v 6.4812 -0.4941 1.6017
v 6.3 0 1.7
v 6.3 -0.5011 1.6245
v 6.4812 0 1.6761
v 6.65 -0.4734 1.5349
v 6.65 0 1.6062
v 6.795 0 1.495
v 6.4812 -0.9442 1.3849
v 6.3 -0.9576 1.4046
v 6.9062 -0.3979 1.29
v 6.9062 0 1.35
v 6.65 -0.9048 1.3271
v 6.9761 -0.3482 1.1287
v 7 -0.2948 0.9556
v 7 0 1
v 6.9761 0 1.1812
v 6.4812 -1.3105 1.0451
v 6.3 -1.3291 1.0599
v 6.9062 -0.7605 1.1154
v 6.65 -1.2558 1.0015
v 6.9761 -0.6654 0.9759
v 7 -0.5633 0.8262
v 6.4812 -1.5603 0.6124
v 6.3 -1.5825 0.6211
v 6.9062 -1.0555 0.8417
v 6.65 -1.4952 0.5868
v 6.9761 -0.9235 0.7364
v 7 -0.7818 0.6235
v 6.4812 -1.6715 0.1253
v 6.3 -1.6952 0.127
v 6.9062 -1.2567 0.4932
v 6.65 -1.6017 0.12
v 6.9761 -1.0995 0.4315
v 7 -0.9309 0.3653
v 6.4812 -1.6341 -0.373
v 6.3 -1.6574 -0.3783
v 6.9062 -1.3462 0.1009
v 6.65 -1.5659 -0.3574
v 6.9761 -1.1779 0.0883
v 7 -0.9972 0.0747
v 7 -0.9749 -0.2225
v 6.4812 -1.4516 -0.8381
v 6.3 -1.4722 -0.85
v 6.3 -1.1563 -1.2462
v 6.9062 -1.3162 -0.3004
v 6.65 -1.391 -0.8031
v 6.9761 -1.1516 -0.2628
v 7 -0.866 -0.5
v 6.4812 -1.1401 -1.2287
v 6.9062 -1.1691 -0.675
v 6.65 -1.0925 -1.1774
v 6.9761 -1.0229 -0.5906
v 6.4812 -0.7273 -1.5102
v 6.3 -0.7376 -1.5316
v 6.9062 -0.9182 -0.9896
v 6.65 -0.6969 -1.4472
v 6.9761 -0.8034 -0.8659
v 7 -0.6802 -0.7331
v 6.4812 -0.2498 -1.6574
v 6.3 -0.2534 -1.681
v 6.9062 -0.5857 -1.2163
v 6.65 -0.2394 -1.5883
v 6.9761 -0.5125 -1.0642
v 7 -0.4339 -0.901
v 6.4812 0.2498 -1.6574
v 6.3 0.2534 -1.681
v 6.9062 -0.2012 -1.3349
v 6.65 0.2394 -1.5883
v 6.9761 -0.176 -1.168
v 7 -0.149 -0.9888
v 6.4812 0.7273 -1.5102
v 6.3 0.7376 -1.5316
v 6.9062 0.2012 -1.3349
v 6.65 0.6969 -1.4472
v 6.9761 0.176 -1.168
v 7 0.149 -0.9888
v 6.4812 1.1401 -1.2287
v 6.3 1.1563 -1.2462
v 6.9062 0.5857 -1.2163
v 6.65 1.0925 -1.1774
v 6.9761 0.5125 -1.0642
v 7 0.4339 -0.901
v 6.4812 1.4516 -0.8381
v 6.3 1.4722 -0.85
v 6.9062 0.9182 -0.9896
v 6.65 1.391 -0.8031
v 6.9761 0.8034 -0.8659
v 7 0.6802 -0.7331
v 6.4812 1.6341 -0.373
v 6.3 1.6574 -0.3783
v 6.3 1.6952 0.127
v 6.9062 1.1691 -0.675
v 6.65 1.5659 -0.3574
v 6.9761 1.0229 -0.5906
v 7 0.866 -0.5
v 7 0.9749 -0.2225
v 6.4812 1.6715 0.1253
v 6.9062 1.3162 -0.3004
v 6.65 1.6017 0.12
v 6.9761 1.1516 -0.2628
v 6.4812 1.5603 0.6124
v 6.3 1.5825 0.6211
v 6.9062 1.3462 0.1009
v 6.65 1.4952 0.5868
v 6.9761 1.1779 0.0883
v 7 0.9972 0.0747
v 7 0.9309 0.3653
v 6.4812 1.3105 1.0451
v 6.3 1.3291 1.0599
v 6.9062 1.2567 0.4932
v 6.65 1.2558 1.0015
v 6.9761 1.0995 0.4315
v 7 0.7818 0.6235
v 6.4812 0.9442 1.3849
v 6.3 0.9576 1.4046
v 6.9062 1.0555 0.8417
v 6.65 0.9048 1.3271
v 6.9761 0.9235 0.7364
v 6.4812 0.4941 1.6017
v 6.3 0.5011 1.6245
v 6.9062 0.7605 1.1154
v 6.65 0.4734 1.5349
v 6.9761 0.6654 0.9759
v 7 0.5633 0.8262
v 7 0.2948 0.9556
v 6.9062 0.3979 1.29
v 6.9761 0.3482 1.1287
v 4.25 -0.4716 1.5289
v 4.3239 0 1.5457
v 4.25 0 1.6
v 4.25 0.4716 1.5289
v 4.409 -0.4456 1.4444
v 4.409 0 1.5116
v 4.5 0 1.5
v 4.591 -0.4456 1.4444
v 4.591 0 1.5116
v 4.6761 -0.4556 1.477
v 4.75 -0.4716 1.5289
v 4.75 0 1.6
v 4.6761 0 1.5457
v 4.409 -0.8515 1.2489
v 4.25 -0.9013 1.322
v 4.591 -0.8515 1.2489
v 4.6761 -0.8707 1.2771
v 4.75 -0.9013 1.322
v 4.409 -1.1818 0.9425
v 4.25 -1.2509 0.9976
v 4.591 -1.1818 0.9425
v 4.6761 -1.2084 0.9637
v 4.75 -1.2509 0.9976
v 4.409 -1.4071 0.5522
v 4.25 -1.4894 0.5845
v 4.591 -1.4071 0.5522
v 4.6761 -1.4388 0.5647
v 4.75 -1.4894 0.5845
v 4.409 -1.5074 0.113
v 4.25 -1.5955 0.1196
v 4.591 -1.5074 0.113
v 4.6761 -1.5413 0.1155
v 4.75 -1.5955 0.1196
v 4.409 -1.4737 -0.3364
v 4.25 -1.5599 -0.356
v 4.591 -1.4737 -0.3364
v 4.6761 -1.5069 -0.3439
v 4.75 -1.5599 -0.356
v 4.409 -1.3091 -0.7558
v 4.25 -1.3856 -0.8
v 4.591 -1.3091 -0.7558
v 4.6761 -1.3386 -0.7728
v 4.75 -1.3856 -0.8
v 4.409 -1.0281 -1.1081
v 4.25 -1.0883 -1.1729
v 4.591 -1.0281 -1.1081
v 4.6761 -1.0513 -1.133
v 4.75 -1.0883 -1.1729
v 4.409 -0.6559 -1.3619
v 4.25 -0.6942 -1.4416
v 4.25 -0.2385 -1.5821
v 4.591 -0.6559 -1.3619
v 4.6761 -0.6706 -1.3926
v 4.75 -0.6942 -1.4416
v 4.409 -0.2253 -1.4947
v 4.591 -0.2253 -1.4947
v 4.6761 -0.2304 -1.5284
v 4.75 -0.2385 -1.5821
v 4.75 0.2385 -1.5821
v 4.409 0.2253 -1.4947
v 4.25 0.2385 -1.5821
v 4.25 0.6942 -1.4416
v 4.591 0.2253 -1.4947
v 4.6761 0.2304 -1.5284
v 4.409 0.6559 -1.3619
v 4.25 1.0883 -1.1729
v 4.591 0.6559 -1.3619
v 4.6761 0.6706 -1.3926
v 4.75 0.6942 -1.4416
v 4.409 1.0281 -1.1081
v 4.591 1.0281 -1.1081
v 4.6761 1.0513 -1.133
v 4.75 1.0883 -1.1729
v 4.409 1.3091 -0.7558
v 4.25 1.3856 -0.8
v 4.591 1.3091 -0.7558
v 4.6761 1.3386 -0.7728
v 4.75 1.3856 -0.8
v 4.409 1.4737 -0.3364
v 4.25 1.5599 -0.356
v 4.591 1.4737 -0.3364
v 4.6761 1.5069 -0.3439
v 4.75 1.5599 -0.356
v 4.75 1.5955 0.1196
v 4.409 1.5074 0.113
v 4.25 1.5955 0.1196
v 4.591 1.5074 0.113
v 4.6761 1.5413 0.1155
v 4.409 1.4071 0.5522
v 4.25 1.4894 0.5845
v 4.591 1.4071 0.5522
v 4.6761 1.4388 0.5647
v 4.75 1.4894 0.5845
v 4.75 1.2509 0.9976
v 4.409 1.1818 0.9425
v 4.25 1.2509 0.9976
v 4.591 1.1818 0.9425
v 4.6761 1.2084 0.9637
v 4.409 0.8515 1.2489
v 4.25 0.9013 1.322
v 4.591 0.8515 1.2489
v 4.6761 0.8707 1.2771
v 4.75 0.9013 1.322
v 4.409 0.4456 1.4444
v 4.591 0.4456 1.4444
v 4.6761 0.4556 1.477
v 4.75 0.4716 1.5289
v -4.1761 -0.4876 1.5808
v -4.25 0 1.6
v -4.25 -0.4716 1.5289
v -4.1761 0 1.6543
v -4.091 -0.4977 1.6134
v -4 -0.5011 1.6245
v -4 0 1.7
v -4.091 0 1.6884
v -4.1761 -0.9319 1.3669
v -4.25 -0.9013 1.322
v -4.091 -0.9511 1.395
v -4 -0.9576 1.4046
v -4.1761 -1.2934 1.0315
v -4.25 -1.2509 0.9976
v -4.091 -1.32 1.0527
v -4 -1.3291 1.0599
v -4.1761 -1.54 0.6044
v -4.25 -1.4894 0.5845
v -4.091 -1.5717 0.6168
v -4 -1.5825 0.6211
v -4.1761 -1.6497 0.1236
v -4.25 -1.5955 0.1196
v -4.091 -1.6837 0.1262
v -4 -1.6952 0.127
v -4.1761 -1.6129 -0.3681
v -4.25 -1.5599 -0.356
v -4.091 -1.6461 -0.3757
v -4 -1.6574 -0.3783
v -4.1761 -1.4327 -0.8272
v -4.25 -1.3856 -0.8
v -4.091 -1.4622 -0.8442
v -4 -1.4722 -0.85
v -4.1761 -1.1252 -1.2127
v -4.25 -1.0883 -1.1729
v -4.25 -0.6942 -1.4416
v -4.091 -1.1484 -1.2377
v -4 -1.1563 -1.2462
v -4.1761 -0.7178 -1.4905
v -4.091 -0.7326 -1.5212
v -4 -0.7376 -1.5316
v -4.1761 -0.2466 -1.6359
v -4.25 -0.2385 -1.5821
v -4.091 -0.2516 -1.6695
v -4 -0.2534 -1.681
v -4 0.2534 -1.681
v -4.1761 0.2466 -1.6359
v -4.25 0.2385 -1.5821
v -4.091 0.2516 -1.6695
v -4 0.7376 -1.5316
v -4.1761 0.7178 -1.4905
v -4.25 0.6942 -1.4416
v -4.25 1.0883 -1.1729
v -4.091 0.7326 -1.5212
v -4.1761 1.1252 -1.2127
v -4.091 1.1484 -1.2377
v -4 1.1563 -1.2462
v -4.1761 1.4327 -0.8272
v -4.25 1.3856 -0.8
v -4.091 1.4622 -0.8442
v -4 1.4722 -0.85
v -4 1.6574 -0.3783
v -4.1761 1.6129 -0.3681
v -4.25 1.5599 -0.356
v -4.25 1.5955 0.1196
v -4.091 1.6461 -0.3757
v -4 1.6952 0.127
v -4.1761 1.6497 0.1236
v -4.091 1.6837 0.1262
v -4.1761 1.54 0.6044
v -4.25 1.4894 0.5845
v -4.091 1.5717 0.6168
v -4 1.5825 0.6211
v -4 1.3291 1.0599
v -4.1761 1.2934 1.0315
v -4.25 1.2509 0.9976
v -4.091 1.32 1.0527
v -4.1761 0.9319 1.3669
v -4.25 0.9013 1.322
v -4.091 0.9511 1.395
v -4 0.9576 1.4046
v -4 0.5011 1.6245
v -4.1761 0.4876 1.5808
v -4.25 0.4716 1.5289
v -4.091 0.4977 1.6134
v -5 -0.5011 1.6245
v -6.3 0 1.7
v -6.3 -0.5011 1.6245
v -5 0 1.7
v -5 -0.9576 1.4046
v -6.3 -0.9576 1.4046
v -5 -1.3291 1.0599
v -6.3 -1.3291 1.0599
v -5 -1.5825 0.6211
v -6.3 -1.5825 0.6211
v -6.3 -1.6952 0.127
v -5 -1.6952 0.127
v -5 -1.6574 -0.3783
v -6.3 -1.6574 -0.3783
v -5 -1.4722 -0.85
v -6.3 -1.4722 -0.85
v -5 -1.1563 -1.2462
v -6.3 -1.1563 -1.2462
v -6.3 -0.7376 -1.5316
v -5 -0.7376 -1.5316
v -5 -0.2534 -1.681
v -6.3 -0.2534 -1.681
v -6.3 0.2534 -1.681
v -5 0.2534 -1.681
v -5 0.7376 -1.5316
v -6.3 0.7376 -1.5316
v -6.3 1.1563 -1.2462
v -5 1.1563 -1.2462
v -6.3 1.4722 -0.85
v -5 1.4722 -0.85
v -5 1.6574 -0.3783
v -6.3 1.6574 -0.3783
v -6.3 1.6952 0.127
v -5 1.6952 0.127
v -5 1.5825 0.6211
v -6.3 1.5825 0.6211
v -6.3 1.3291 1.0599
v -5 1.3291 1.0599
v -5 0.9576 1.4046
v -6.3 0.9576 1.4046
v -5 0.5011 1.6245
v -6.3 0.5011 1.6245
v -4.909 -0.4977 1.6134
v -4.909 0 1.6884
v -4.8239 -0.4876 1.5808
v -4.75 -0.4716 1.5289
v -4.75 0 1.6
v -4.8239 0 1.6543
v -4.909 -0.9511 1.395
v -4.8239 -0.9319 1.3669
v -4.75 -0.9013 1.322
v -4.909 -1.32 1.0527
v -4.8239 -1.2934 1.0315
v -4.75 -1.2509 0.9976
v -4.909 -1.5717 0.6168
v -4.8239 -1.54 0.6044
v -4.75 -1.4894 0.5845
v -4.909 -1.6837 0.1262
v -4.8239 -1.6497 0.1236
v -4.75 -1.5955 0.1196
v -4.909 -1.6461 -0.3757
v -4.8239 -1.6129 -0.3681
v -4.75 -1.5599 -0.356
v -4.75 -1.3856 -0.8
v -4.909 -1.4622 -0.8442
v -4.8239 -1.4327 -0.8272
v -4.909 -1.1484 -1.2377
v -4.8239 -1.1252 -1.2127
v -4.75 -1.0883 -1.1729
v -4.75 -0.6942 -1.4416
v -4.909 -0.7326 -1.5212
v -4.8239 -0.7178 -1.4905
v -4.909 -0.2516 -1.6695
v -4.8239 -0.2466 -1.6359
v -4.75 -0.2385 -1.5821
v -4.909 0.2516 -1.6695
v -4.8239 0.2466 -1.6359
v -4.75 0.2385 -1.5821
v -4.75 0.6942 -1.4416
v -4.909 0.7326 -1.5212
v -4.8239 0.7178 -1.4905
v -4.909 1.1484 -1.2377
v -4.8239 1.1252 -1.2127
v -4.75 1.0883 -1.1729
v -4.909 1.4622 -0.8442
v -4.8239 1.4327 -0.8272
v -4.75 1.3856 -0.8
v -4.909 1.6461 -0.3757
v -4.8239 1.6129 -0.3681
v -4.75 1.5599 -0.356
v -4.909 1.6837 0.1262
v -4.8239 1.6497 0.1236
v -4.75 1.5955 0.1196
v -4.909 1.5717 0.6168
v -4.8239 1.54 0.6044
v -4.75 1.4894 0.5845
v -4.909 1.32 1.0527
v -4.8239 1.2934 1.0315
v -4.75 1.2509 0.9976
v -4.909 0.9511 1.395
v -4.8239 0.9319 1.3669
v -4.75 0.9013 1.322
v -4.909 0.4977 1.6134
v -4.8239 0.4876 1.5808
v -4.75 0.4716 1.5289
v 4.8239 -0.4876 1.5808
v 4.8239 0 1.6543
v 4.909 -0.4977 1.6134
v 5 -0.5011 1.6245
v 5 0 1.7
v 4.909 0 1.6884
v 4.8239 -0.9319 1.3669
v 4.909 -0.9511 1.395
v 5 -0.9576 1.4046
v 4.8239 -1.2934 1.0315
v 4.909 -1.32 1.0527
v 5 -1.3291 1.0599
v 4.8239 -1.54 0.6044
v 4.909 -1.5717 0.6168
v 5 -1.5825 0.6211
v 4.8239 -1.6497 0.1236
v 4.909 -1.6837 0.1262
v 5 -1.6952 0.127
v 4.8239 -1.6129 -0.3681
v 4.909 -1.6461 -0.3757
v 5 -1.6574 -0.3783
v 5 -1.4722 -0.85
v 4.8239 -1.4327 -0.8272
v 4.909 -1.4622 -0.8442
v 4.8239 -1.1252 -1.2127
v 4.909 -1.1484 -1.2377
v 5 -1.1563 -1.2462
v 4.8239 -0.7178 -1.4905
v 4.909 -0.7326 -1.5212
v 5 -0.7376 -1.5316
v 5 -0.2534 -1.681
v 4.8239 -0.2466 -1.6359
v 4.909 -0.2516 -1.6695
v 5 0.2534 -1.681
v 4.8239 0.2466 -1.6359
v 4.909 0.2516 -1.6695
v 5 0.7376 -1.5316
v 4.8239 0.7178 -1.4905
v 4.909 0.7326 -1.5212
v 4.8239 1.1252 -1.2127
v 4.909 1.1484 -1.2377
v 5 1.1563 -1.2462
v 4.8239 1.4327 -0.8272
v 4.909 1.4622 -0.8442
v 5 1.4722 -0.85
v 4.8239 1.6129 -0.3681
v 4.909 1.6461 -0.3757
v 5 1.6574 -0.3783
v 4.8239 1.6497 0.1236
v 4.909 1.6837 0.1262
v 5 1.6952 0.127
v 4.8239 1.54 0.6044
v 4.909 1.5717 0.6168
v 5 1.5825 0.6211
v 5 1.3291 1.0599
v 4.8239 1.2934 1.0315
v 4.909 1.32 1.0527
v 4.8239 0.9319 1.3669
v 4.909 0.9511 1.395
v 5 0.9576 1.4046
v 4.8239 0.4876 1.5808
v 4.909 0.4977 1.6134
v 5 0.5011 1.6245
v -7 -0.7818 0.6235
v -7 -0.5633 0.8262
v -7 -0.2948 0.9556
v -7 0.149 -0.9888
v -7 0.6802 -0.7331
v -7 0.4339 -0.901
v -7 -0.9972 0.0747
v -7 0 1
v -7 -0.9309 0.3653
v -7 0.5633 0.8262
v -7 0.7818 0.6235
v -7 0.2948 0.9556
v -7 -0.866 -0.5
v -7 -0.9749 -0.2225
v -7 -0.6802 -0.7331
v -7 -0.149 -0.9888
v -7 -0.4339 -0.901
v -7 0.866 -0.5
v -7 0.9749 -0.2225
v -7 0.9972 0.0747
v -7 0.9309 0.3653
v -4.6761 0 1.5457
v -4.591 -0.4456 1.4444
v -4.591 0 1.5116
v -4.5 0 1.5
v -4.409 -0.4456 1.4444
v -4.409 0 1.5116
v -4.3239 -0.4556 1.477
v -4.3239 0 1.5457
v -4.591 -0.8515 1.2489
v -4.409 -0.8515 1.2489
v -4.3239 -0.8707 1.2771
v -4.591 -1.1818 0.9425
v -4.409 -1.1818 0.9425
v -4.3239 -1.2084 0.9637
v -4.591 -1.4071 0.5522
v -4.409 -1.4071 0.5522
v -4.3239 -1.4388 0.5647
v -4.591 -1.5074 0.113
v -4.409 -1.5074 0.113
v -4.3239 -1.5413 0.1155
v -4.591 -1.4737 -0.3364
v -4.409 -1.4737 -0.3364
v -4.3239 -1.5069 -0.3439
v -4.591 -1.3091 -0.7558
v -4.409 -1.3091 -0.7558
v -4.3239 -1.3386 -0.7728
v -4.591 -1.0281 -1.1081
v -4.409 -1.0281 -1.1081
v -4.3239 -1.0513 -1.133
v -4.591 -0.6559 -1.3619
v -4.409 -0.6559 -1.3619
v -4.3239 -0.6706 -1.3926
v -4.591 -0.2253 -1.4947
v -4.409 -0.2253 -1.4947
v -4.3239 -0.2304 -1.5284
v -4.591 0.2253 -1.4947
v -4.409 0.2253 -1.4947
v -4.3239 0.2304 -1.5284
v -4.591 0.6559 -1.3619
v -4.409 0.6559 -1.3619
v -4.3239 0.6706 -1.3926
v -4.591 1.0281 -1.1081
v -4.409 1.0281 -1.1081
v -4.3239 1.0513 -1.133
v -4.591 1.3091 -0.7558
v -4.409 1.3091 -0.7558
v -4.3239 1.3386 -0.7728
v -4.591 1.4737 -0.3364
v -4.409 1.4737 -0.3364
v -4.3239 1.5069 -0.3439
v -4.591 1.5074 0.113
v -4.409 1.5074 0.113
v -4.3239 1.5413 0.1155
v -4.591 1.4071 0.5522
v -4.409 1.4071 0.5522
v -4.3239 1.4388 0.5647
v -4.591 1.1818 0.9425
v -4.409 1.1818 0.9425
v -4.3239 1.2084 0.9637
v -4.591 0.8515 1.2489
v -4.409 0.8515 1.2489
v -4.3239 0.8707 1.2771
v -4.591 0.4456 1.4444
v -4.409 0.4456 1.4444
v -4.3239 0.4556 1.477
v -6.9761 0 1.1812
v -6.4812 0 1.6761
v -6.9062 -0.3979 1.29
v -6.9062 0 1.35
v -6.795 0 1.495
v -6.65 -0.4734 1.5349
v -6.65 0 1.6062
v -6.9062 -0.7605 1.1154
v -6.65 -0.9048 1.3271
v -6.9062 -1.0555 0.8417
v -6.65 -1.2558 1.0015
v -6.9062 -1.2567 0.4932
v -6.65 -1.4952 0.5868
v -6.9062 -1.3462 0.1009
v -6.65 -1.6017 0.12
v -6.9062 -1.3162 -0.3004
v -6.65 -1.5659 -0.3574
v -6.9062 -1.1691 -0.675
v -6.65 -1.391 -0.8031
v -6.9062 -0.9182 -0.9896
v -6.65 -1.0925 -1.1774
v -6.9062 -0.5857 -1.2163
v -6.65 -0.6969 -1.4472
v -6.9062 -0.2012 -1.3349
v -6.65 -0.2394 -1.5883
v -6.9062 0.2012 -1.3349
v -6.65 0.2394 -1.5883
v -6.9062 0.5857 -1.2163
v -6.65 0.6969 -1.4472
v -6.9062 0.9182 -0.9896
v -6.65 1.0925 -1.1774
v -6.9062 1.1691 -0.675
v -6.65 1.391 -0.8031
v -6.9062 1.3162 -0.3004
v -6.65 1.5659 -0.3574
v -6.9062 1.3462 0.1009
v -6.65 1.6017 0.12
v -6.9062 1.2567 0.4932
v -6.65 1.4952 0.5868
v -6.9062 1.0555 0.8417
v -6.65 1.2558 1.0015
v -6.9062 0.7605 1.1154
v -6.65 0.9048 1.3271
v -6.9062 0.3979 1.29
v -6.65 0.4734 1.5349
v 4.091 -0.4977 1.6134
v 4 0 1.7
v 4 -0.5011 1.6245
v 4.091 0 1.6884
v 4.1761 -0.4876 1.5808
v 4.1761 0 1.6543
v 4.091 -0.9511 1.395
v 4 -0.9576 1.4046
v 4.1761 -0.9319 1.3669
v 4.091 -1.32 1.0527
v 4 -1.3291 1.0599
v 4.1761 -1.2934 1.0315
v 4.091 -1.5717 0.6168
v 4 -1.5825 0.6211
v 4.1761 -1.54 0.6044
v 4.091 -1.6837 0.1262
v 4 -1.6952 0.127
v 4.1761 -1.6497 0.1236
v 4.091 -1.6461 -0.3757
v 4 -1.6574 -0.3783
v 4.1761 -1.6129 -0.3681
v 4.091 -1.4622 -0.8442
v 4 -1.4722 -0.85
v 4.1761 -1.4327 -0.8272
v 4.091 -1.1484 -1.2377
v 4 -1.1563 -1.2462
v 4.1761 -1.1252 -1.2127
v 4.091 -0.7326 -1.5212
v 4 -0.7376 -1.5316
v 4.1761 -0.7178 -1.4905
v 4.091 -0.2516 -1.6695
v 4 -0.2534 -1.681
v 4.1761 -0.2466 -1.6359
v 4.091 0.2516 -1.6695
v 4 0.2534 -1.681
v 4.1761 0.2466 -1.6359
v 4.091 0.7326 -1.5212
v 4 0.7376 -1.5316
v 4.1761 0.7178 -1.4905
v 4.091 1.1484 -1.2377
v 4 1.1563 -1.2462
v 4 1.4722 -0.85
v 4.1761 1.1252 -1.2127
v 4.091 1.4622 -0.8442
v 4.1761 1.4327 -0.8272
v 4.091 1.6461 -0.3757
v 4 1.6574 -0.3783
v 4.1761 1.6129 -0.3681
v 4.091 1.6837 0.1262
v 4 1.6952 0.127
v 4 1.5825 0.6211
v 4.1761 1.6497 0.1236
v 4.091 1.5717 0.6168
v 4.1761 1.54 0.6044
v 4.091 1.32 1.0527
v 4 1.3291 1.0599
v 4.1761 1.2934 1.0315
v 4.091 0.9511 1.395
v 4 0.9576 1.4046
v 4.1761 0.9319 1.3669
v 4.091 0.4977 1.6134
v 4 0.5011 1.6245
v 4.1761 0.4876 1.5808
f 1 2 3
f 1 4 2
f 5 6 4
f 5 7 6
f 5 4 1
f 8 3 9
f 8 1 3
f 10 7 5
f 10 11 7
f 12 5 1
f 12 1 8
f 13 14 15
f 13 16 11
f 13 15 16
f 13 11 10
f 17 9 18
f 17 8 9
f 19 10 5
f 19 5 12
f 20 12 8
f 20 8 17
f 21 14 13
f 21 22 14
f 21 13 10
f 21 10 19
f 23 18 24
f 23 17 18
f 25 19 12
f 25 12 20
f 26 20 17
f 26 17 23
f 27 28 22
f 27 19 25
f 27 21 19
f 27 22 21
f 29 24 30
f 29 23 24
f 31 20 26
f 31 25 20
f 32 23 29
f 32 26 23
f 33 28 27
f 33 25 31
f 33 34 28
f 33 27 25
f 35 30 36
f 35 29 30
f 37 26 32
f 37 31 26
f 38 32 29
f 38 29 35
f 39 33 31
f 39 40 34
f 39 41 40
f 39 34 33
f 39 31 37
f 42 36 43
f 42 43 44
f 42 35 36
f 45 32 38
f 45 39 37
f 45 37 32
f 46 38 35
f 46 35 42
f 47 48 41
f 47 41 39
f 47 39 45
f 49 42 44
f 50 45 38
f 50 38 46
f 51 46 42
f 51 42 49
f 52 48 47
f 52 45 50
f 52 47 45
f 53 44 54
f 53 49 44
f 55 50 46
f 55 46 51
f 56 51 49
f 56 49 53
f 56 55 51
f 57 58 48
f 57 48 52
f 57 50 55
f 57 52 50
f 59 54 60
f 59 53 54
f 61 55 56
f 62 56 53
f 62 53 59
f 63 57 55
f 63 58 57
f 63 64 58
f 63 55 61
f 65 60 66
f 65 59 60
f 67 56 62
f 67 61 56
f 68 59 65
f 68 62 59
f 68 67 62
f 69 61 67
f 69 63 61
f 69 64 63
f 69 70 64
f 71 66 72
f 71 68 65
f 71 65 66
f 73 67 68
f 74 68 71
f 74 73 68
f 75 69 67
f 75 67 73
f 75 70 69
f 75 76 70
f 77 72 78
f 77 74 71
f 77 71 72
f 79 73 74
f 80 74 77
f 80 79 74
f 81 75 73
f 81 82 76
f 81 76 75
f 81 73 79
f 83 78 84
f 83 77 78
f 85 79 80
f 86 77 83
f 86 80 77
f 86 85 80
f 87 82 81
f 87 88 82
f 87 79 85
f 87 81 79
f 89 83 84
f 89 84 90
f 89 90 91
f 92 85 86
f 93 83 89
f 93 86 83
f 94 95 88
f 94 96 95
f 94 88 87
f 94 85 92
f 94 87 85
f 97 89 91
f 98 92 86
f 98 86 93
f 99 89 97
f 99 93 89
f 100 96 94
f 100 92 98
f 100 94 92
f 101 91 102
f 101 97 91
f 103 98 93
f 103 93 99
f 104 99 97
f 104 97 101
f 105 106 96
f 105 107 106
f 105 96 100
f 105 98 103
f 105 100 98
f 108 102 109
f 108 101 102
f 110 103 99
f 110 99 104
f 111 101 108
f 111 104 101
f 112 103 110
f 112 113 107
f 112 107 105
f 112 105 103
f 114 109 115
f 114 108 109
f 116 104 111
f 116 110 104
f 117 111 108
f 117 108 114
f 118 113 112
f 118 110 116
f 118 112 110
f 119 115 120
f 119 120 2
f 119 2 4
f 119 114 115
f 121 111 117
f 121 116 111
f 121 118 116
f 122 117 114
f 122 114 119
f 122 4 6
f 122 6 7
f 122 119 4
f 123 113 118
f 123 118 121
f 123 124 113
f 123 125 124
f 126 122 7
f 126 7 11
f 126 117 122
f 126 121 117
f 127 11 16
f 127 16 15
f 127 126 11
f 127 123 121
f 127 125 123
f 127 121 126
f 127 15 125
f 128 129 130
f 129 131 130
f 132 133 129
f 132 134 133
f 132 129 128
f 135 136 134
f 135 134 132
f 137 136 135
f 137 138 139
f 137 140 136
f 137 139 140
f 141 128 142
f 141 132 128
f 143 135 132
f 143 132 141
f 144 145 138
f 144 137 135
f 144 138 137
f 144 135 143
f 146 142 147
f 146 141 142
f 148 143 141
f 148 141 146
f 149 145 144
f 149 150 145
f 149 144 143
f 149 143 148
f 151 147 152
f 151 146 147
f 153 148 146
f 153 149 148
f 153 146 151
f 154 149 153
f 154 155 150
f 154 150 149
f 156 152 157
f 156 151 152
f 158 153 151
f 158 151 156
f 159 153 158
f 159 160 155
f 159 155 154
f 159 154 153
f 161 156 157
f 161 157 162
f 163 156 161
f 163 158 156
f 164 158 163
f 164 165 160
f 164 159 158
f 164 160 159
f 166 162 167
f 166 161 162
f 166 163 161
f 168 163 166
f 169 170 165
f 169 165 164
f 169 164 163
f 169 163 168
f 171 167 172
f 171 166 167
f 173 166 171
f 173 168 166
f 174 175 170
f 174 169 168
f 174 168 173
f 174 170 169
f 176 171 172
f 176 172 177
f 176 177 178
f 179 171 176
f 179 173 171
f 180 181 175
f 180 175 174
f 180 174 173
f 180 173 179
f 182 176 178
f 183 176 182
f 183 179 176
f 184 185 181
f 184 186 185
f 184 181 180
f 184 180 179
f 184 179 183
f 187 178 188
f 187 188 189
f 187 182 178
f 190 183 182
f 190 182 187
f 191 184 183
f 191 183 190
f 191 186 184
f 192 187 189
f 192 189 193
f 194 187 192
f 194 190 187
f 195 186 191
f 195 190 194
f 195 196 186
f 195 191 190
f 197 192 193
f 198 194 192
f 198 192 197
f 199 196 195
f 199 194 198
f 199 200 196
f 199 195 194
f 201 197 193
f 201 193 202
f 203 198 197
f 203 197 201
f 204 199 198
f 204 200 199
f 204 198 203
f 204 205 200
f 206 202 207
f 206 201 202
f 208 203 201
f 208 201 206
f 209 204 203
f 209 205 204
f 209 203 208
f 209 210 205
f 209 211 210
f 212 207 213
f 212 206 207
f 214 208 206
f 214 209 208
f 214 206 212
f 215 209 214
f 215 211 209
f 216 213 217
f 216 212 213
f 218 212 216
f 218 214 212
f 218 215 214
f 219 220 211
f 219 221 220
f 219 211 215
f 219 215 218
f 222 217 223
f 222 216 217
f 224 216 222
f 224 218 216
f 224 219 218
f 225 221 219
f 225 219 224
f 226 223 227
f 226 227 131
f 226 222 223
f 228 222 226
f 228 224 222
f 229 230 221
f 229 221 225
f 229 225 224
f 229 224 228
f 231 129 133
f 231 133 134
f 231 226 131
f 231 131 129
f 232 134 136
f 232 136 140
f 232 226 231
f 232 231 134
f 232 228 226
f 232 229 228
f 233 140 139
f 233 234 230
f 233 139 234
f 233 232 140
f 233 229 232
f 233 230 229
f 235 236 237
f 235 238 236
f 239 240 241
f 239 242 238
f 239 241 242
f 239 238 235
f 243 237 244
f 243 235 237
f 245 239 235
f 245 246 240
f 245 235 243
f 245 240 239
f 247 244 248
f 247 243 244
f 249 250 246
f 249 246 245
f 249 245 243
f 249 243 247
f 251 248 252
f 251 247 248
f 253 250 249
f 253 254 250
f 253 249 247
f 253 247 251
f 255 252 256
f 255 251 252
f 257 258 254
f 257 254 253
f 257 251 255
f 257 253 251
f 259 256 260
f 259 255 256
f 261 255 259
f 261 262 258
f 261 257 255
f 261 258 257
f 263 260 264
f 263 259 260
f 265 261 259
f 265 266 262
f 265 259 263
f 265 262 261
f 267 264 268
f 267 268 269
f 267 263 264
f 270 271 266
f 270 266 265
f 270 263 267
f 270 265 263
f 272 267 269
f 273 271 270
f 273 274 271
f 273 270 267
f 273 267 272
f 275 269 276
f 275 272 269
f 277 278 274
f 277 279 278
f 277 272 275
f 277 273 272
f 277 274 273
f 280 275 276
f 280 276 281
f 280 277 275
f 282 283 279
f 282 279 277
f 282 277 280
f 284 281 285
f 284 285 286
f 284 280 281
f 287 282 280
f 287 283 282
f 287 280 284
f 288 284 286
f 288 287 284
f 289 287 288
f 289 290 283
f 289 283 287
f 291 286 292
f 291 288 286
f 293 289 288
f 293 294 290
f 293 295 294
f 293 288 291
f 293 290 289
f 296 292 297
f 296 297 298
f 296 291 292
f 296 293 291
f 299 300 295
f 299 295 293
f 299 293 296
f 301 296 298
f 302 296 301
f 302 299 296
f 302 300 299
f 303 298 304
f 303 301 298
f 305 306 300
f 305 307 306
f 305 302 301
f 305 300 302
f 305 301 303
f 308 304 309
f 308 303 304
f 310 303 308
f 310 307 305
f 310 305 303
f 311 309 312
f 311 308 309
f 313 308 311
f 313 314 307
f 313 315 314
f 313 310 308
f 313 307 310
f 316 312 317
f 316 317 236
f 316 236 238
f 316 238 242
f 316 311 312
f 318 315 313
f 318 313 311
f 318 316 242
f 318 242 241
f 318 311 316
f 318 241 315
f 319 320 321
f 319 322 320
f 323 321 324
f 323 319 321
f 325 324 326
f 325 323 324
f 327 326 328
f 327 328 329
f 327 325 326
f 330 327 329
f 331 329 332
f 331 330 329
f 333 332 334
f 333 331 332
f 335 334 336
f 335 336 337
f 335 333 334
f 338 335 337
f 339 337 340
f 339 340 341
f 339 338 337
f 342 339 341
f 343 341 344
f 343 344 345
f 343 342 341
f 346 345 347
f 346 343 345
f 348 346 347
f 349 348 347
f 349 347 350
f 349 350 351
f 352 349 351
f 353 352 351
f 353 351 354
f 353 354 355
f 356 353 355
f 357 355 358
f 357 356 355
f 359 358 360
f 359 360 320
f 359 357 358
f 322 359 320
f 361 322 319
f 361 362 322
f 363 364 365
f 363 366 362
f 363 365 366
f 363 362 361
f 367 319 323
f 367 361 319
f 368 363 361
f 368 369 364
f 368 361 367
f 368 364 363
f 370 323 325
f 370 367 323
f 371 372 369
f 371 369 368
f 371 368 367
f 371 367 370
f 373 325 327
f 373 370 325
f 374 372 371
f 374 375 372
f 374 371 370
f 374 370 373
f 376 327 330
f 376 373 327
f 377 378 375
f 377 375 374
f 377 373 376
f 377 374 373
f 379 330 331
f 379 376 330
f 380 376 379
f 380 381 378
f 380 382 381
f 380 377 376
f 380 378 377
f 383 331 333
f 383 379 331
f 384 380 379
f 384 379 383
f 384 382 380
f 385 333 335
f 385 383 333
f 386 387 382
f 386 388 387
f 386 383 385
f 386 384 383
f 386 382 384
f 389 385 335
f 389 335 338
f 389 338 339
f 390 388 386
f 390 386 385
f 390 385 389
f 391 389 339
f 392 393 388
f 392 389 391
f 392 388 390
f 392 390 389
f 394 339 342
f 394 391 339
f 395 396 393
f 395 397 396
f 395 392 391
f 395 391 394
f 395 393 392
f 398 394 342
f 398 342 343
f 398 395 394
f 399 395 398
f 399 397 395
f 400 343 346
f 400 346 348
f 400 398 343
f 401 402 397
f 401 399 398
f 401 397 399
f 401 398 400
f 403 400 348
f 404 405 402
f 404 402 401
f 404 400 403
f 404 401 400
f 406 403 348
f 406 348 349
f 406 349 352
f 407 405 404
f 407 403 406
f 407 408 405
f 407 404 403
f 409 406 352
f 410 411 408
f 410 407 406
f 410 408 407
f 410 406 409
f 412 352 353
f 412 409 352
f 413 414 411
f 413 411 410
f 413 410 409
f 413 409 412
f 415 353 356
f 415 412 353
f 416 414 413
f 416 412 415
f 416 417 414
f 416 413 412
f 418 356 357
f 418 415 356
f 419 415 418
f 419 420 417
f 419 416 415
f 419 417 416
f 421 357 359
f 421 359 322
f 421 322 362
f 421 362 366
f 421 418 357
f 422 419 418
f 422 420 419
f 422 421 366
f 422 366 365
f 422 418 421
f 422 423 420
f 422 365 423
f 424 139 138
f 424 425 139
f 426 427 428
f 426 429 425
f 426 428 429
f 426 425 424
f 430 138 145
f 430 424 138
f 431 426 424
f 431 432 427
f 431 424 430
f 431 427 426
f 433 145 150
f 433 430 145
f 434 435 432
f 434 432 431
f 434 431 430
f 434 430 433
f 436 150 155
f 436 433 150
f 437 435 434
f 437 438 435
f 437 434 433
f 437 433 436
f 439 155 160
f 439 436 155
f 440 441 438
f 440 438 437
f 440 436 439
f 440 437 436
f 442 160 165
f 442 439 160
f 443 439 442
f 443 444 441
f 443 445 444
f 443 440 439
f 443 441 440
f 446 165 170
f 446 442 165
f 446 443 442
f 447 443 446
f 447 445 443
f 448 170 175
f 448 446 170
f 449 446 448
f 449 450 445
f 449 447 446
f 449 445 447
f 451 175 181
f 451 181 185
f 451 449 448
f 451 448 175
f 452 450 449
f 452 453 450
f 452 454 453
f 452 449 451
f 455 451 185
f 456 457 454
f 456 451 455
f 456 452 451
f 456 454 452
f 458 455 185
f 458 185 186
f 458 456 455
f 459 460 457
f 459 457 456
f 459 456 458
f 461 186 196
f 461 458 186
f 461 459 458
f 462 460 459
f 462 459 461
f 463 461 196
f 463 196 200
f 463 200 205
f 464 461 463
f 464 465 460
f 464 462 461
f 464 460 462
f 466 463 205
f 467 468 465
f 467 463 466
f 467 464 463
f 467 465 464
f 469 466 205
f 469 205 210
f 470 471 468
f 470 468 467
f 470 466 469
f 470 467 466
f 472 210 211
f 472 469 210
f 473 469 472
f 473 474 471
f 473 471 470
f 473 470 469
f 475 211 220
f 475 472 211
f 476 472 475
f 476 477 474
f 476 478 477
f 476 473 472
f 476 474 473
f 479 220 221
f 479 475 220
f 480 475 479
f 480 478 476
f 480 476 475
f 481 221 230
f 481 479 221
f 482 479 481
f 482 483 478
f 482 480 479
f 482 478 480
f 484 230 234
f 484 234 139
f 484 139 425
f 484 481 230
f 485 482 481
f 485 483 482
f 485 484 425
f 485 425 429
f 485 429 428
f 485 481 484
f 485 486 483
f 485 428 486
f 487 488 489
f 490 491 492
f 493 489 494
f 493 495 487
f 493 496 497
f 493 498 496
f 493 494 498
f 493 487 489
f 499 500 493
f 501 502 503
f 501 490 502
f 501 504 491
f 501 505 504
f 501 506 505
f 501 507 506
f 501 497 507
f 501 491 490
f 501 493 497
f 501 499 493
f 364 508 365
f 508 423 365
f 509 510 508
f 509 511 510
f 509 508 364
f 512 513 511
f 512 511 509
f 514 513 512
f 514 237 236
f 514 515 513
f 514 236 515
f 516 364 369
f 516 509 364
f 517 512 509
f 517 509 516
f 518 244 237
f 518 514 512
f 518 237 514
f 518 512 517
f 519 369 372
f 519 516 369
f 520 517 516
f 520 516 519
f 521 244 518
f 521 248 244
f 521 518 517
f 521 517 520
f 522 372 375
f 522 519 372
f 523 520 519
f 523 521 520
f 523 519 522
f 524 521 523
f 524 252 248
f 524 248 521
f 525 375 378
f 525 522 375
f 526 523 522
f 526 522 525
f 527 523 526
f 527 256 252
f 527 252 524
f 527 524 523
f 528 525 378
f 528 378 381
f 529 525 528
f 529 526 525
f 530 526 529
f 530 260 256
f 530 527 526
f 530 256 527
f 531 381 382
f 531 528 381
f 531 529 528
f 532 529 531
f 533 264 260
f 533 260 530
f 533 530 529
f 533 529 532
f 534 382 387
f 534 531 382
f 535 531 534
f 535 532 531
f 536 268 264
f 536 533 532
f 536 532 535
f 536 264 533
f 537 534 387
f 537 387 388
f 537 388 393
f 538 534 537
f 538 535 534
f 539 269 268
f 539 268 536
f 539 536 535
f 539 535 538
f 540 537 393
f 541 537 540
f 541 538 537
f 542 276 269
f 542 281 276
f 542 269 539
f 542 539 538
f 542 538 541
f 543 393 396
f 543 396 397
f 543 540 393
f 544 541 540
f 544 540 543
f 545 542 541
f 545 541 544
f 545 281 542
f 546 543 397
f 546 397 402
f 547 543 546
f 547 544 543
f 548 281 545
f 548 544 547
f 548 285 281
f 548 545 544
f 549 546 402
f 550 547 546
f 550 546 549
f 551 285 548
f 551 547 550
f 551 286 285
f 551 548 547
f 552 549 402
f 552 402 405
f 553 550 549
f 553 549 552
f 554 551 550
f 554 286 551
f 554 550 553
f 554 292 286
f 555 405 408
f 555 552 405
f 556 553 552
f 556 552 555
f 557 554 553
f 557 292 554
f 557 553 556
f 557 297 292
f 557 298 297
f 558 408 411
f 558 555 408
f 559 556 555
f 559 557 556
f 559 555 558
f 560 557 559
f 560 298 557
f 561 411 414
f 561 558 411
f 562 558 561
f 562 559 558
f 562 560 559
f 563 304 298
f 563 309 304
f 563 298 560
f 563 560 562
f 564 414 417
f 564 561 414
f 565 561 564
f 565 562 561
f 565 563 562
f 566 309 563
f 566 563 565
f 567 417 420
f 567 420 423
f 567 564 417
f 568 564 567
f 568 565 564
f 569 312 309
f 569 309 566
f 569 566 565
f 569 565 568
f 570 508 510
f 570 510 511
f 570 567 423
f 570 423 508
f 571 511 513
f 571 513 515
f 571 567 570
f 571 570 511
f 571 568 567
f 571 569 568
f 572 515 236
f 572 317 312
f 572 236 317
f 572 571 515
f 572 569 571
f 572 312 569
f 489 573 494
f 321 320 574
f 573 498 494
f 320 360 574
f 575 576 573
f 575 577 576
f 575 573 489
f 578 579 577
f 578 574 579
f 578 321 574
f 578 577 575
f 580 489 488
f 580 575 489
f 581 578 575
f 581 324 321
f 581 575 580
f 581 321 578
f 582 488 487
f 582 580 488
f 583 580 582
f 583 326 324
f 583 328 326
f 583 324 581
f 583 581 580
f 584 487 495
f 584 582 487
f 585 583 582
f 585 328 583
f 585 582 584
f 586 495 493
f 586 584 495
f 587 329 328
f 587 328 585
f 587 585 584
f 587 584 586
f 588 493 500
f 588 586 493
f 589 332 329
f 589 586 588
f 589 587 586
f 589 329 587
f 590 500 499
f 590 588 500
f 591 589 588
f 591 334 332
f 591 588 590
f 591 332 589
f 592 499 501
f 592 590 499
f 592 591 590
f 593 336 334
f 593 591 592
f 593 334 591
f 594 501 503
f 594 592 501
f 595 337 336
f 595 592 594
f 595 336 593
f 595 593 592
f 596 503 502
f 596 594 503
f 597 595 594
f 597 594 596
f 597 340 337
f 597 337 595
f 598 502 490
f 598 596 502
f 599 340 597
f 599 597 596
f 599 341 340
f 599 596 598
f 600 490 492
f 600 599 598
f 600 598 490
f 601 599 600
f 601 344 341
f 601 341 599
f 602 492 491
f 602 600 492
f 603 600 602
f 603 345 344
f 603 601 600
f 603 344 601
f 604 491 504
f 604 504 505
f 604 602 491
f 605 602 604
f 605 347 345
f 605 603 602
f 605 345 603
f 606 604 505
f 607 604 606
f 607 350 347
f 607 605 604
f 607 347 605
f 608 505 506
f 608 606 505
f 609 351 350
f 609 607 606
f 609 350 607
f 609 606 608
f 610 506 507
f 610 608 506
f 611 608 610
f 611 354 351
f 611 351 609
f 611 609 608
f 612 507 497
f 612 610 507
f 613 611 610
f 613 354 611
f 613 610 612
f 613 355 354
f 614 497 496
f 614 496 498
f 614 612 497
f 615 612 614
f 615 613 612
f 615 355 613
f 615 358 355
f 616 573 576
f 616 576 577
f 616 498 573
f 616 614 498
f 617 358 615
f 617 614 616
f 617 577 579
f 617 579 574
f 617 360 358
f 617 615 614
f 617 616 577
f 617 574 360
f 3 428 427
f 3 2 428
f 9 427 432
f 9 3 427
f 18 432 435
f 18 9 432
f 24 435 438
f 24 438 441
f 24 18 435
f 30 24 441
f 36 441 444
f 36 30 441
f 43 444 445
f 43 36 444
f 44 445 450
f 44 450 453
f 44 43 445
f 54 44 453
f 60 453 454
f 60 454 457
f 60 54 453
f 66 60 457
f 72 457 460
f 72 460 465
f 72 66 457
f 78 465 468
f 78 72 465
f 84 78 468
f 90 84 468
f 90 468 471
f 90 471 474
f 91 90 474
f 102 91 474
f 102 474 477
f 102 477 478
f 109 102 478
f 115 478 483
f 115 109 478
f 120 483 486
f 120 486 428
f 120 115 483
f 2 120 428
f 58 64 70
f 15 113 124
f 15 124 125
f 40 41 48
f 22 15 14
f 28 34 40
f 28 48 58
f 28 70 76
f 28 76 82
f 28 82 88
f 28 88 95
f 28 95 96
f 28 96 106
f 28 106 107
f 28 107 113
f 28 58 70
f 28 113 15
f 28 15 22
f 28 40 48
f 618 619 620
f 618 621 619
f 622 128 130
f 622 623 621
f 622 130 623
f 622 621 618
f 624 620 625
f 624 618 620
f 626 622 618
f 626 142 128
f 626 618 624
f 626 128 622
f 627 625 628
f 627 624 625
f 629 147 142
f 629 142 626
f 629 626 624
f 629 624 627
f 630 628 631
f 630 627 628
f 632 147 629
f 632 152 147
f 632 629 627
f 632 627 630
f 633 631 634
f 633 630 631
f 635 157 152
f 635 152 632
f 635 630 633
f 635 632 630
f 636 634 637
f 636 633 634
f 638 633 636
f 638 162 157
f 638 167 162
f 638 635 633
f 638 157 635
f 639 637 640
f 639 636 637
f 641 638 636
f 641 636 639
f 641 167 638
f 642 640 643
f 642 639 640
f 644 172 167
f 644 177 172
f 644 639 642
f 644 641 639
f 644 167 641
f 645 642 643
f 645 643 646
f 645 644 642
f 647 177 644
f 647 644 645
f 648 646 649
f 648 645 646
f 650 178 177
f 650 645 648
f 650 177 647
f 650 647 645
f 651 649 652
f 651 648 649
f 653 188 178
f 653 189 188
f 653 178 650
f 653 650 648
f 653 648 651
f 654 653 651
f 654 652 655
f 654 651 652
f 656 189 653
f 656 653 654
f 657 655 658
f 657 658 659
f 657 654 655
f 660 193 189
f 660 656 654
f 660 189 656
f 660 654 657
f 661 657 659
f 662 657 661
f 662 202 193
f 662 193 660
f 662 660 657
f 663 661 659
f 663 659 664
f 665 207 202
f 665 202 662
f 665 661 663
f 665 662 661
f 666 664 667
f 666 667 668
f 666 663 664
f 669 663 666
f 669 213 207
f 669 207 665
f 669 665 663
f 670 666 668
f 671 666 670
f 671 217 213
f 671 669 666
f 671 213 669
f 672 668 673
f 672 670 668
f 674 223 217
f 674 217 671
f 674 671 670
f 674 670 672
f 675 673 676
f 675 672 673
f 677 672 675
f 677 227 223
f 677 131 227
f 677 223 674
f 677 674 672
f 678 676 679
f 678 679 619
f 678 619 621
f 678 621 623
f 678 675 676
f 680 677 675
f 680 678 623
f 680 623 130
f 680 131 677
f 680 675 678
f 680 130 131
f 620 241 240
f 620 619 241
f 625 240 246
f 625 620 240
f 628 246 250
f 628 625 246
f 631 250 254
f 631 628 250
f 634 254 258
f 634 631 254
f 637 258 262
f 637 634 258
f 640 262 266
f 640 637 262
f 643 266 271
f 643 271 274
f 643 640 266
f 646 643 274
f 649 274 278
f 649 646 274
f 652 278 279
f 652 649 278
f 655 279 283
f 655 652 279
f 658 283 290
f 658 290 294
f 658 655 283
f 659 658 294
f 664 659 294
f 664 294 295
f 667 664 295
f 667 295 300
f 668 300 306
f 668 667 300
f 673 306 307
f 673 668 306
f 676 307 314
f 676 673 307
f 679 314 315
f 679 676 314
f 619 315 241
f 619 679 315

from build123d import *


with BuildPart() as part:
    # Sketch2 → Revolve1 (revolve)
    with BuildSketch(Plane.XY, mode=Mode.PRIVATE) as revolve1_sk:
        with BuildLine():
            Line((-6.3, 1.7), (-5, 1.7))
            ThreePointArc((-5, 1.7), (-4.86537088, 1.6740728), (-4.75, 1.6))
            ThreePointArc((-4.75, 1.6), (-4.5, 1.5), (-4.25, 1.6))
            ThreePointArc((-4.25, 1.6), (-4.13462912, 1.6740728), (-4, 1.7))
            Line((-4, 1.7), (4, 1.7))
            ThreePointArc((4, 1.7), (4.13462912, 1.6740728), (4.25, 1.6))
            ThreePointArc((4.25, 1.6), (4.5, 1.5), (4.75, 1.6))
            ThreePointArc((4.75, 1.6), (4.86537088, 1.6740728), (5, 1.7))
            Line((5, 1.7), (6.3, 1.7))
            ThreePointArc((6.3, 1.7), (6.794974747, 1.494974747), (7, 1))
            Line((7, 1), (7, 0))
            Line((7, 0), (-7, 0))
            Line((-7, 0), (-7, 1))
            ThreePointArc((-7, 1), (-6.794974747, 1.494974747), (-6.3, 1.7))
        make_face()
    revolve(revolve1_sk.sketch.rotate(Axis((-7, 0, 0), (1, 0, 0)), 90), axis=Axis((-7, 0, 0), (1, 0, 0)))


solid = part.part
